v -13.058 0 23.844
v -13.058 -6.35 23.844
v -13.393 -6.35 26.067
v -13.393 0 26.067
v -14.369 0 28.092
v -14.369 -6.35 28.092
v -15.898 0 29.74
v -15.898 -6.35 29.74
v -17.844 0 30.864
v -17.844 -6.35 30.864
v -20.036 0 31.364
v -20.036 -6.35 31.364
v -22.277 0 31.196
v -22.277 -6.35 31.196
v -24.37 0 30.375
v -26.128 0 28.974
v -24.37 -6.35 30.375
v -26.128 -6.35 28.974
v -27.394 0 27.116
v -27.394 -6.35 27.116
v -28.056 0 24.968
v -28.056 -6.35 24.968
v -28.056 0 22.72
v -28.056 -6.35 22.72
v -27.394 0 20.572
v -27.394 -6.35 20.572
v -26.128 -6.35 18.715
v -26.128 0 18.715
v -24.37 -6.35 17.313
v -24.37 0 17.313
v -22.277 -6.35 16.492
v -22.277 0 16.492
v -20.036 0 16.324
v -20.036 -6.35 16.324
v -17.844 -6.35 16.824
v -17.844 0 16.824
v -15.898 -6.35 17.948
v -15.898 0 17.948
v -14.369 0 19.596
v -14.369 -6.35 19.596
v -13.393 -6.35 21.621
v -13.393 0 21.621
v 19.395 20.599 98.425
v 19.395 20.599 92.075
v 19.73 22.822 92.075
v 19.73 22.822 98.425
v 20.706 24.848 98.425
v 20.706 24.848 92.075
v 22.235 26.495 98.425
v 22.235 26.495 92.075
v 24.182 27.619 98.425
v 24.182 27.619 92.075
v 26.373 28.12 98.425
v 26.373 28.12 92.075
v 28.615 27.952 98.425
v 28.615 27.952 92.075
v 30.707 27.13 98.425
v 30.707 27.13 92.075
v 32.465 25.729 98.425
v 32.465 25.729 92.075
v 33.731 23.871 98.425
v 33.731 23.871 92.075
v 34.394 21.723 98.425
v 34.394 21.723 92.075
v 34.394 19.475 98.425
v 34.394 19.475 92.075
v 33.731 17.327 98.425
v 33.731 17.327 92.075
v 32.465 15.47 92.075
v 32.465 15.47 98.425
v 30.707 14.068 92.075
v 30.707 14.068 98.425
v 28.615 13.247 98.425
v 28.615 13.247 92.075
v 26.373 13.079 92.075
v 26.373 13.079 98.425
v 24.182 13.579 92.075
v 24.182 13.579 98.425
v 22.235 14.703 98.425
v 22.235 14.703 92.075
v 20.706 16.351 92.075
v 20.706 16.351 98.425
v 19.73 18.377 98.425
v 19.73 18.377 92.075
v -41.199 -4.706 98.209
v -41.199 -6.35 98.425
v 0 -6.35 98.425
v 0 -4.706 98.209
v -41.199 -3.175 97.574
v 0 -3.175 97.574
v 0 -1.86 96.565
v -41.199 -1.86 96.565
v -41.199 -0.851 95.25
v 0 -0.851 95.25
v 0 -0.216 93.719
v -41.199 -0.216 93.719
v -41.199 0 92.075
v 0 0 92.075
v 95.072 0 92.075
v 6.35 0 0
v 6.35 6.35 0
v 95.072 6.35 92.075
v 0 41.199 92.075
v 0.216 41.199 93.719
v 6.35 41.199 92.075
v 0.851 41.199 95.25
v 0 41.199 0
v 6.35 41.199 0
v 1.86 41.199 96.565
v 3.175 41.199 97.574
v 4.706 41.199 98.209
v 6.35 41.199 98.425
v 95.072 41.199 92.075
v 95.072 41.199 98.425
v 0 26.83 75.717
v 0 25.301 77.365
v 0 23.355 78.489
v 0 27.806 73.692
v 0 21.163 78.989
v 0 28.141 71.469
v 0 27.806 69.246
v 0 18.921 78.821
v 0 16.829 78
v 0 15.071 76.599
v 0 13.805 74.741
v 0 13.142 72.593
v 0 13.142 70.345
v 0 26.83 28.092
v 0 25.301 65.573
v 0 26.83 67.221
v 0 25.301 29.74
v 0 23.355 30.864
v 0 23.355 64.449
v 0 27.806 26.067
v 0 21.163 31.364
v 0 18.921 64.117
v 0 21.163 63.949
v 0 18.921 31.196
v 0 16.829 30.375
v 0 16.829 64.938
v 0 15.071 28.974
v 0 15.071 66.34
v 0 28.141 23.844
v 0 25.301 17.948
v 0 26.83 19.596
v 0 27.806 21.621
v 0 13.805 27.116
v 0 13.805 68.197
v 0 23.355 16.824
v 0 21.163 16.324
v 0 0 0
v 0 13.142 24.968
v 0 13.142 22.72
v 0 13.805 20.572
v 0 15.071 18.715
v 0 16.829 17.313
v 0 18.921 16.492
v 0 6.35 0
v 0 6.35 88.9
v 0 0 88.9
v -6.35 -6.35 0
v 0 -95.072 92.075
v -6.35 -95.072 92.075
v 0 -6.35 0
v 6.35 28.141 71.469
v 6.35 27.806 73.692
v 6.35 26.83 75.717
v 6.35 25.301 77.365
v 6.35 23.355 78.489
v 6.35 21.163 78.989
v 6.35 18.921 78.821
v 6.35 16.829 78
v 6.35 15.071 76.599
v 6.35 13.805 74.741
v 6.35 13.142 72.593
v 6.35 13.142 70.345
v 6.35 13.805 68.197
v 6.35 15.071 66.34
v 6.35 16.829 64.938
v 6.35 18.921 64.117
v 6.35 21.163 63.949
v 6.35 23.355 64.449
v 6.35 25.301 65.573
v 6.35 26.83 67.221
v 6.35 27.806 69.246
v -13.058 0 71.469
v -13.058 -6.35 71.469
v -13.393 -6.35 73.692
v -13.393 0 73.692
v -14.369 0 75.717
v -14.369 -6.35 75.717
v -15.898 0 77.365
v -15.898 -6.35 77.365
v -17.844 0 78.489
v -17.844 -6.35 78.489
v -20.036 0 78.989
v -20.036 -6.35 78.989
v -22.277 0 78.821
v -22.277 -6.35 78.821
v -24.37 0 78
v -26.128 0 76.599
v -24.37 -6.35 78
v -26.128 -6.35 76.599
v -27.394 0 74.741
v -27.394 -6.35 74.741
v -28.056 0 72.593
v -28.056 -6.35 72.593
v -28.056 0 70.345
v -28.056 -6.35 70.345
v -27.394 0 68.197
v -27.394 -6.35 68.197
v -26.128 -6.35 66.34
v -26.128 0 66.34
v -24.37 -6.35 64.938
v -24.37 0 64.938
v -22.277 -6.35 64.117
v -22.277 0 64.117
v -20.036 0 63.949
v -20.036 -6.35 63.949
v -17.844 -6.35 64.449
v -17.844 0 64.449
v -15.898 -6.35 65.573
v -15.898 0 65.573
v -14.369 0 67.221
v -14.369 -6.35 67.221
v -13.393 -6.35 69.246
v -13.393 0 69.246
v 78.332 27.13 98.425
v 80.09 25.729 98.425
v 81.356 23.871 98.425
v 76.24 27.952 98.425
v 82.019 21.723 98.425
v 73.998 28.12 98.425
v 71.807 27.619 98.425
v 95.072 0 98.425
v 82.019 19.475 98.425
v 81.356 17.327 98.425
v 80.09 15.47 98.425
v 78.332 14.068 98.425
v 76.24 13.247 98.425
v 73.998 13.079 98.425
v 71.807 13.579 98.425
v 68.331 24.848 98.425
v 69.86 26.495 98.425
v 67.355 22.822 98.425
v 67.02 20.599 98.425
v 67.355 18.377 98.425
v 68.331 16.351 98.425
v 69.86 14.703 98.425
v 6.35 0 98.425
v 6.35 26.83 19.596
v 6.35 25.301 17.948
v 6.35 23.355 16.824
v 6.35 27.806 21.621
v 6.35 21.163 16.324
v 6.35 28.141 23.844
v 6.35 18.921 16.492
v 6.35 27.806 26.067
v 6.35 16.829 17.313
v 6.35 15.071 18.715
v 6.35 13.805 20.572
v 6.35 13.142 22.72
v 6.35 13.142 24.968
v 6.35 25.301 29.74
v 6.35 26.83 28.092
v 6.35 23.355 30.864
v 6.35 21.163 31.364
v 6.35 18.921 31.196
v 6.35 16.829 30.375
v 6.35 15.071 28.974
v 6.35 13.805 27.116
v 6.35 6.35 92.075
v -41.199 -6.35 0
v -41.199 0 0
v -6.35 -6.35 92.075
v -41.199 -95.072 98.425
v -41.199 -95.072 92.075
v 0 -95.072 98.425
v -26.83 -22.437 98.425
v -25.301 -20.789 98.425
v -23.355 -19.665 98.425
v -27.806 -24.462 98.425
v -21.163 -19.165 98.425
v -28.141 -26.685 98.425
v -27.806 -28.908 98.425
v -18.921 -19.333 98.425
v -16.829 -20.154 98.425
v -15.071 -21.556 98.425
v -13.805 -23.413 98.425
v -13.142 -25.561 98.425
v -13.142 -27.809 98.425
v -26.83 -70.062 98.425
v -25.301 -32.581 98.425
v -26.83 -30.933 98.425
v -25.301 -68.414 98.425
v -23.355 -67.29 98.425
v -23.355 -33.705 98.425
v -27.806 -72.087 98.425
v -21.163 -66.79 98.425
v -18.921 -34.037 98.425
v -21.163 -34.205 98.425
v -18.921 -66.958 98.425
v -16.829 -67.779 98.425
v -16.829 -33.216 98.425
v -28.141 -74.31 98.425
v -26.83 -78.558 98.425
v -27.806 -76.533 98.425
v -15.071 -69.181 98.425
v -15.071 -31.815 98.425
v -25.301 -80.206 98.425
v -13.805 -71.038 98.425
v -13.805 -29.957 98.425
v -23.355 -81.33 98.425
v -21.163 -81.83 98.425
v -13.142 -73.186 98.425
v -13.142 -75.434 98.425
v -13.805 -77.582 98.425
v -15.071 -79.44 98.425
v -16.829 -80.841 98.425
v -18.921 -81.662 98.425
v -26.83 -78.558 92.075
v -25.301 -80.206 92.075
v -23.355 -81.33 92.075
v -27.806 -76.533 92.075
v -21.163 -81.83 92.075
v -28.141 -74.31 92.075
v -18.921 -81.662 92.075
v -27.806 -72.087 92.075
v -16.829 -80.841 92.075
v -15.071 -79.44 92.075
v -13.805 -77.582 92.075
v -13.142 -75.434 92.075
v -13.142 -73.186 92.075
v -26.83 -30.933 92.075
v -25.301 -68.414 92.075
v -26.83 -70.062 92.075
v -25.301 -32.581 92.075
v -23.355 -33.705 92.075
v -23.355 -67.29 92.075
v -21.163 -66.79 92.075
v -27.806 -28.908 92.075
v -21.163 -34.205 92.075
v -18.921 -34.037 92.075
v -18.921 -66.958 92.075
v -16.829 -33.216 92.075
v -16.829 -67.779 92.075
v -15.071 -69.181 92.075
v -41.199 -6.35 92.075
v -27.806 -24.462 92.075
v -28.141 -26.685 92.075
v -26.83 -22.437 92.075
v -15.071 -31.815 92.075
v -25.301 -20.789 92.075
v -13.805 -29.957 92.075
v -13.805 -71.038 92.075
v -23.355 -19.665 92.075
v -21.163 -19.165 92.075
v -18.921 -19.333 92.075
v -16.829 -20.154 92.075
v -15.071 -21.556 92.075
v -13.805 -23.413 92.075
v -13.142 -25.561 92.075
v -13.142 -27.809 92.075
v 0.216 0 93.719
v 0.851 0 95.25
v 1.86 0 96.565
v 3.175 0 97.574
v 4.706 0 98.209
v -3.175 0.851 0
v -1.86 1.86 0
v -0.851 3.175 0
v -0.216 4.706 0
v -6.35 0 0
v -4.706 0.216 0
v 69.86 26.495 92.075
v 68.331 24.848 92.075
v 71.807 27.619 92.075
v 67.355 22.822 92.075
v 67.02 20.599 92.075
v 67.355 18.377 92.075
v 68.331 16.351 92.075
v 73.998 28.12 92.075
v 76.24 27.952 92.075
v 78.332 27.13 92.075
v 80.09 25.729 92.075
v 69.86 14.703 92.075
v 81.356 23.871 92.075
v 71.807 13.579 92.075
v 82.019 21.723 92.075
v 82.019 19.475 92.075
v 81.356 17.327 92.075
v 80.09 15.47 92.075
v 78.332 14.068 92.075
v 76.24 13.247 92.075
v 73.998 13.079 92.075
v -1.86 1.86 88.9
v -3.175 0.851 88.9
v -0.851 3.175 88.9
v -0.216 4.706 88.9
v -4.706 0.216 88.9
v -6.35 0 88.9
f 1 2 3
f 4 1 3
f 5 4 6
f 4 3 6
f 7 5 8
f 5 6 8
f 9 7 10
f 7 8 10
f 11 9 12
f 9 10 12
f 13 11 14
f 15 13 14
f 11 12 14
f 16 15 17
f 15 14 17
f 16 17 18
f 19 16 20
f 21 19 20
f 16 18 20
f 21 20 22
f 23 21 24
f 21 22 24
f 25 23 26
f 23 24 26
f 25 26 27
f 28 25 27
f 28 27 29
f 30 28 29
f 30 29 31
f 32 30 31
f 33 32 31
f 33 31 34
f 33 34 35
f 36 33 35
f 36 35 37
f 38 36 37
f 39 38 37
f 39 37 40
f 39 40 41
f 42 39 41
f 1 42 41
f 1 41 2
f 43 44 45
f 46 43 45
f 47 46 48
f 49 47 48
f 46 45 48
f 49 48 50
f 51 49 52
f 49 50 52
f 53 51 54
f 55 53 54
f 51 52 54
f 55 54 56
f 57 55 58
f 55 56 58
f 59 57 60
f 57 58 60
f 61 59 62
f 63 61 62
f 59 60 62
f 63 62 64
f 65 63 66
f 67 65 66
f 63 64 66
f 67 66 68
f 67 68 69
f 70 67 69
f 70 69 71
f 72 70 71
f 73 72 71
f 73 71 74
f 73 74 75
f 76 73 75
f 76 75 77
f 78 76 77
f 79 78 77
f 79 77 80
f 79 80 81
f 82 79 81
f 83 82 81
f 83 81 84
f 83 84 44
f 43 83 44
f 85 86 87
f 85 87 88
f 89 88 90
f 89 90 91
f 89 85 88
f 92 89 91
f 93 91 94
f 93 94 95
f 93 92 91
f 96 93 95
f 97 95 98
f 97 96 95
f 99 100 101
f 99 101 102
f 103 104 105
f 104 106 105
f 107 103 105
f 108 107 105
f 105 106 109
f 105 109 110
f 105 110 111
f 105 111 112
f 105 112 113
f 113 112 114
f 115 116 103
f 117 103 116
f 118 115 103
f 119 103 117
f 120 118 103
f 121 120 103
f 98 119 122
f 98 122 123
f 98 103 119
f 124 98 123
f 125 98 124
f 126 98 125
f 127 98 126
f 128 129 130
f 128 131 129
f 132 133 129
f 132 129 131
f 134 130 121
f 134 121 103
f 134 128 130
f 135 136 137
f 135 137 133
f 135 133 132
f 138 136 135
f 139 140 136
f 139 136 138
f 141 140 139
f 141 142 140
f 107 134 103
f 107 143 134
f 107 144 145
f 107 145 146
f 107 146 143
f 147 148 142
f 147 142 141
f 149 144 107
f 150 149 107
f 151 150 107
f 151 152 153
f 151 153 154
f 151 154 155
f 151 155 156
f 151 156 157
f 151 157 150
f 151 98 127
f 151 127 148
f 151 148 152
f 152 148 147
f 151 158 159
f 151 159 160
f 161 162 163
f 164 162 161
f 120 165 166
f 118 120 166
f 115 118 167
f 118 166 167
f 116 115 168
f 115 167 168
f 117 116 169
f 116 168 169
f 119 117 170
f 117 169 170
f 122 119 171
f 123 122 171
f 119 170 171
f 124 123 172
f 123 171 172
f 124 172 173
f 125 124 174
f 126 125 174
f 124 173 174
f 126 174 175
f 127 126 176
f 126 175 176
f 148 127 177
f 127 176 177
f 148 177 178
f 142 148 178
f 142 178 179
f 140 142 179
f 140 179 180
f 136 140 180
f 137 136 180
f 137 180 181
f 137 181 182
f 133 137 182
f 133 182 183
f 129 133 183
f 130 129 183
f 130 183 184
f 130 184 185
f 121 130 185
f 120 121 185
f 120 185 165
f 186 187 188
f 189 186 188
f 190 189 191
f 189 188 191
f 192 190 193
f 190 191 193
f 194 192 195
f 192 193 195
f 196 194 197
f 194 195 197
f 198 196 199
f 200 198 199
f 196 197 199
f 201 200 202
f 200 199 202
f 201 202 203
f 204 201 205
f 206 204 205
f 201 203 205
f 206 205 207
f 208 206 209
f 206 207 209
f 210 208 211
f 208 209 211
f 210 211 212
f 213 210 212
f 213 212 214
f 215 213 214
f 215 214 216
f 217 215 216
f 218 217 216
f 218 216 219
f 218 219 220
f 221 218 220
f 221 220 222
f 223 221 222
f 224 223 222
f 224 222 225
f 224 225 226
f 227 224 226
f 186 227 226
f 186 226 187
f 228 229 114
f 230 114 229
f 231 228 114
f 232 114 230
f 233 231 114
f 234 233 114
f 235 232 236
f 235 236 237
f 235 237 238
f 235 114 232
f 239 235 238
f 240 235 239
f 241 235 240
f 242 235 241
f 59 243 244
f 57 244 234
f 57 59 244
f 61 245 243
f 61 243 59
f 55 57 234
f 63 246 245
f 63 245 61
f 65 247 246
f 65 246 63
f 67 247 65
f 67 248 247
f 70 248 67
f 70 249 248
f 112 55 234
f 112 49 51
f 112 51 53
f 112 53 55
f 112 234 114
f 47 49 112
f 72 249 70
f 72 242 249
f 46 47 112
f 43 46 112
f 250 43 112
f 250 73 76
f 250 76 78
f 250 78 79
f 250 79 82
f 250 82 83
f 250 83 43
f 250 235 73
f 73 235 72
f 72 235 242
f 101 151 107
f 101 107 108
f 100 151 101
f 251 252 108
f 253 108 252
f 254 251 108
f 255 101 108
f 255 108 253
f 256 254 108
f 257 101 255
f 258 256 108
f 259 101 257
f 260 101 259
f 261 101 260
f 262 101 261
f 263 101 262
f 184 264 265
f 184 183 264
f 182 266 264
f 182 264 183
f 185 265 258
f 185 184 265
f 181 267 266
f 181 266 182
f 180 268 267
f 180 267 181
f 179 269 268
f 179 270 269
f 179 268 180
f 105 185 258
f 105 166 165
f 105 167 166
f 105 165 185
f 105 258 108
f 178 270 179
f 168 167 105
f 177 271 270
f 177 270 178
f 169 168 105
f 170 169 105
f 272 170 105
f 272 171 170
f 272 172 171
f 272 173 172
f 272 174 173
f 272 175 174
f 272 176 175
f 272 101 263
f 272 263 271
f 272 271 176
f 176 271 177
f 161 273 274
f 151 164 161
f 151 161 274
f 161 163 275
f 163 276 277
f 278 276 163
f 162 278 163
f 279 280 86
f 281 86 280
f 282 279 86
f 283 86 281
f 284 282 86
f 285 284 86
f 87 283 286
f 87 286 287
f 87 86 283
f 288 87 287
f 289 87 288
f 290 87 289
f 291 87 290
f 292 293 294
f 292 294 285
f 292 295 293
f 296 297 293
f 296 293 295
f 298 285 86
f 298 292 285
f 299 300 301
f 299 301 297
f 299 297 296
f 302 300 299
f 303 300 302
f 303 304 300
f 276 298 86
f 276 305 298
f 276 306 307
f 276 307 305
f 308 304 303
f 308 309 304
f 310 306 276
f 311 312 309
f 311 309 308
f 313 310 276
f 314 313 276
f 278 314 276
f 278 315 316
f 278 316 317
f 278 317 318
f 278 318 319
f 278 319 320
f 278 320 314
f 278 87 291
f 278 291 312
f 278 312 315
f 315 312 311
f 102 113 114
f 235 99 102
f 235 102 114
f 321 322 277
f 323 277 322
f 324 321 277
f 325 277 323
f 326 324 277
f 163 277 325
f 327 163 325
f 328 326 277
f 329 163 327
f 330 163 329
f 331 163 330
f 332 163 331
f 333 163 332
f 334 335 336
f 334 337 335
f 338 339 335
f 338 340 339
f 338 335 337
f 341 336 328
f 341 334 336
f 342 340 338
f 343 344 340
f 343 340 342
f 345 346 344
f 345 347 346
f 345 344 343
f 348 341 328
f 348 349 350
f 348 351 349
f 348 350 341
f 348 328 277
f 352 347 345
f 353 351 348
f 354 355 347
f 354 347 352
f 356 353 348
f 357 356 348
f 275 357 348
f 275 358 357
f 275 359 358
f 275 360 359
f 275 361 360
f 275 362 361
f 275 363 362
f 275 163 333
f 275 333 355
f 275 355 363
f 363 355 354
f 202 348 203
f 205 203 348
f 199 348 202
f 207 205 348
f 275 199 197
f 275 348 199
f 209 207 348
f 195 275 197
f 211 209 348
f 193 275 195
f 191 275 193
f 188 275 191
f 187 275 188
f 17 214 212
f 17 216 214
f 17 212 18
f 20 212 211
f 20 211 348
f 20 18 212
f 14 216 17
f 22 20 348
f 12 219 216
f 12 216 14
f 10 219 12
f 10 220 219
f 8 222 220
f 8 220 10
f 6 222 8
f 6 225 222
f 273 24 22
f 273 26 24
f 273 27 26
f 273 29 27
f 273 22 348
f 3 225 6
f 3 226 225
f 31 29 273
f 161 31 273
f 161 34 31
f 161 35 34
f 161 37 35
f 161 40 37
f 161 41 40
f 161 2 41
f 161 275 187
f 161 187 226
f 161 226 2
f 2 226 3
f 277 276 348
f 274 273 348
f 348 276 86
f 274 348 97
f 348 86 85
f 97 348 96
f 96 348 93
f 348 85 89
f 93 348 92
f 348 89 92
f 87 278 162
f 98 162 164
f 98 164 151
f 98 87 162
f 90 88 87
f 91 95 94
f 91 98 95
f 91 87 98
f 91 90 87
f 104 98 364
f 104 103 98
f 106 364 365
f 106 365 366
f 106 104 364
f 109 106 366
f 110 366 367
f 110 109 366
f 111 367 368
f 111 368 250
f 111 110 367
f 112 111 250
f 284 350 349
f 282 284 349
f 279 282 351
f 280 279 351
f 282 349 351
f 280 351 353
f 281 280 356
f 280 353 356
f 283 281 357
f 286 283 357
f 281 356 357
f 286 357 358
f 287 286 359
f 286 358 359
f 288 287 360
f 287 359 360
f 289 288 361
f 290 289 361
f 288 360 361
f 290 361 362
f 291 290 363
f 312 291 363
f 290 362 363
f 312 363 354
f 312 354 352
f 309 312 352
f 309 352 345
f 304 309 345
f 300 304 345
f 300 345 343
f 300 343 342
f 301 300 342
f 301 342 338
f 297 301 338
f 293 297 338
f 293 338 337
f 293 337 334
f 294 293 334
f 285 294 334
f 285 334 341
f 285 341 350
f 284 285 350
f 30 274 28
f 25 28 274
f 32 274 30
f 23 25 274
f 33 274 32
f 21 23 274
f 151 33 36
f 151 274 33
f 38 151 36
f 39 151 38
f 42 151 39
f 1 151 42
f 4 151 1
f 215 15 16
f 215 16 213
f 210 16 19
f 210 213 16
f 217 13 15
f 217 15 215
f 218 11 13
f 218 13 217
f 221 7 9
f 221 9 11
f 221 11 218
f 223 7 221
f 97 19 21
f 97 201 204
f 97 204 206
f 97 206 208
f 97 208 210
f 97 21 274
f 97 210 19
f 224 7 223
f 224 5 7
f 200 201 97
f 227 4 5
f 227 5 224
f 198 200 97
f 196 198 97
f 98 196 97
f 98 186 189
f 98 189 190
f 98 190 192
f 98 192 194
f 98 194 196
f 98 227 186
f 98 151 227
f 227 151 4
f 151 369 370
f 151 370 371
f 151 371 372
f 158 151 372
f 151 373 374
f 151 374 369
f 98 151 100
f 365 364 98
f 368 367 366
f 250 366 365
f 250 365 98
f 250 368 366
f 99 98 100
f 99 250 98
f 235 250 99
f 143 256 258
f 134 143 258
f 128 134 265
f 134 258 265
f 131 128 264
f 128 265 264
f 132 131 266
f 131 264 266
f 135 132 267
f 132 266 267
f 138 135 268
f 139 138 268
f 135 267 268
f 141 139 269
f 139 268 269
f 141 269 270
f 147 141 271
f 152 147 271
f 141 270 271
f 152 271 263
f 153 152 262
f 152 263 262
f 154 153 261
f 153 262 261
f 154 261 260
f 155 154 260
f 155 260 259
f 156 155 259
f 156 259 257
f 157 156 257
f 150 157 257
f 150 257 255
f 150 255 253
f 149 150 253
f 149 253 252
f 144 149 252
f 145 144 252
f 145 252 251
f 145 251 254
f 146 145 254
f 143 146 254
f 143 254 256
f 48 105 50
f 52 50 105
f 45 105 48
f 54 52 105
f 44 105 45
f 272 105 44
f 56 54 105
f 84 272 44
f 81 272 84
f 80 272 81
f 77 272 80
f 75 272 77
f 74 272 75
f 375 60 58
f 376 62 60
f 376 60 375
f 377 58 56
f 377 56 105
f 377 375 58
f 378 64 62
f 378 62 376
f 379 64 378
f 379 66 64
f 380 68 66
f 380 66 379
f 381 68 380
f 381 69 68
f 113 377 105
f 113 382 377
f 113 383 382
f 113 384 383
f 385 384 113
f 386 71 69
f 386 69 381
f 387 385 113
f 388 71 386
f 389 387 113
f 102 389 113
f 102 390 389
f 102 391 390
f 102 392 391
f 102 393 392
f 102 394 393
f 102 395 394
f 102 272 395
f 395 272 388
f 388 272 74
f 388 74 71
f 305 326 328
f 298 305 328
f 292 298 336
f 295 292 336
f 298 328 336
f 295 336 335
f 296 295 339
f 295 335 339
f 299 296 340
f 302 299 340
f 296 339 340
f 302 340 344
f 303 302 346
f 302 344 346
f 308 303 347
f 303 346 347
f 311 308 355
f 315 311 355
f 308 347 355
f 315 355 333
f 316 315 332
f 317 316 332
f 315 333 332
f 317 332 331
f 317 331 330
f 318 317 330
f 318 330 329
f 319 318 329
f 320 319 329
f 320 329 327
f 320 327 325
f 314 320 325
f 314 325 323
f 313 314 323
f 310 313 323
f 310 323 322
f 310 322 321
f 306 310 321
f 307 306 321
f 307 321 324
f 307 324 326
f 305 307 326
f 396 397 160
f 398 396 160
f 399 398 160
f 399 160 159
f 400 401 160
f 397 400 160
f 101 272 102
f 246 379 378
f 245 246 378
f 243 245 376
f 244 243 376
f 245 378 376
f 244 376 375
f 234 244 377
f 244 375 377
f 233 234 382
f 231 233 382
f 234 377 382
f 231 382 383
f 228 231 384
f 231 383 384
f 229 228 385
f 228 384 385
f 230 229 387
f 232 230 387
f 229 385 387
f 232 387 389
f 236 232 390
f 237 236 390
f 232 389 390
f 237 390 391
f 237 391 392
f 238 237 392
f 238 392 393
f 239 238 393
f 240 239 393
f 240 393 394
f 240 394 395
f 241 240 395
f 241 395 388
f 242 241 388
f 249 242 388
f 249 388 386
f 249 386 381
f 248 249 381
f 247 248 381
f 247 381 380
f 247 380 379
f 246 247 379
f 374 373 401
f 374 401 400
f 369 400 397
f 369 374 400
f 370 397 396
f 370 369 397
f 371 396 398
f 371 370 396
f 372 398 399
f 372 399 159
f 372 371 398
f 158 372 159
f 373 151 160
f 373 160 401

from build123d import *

# Parameters (mm, degrees)
F1_DEPTH     = 41.1988
F3_DEPTH     = 41.1988
F4_T1_DEPTH  = 72.9488
F5_R         = 6.35
F14_D        = 15.08252
F14_ON_F9_D  = 15.08252
F14_ON_F11_D = 15.08252
F14_ON_F13_D = 15.08252
F17_DEPTH    = 88.9
F20_DEPTH    = 6.35
F23_DEPTH    = 6.35


# Not quite as in the source:
# - a fillet or chamfer that OpenCascade refuses, or shapes differently, is made with other operations: its cross-section is extruded or revolved along the edge and cut away or added


with BuildPart() as f1:
    # F0 (on Right) → F1 (new body)
    with BuildSketch(Plane.YZ):
        Polygon((0, 98.425), (-95.0722, 98.425), (-95.0722, 92.075), (-6.35, 92.075), (-6.35, 0), (0, 0), align=None)
    extrude(amount=-F1_DEPTH)

    # F2 (on Front) → F3 (join)
    with BuildSketch(Plane.XZ):
        Polygon((95.0722, 92.075), (95.0722, 98.425), (0, 98.425), (0, 0), (6.35, 0), (6.35, 92.075), align=None)
    extrude(amount=-F3_DEPTH)

    # F4: fillet of radius 6.35 on 1 edges, made by hand

    # F4_s2 → F4_t1 (cut)
    with BuildSketch(Plane.YZ.offset(-57.0738)):
        with BuildLine():
            ThreePointArc((-6.35, 98.425), (-1.8598719395, 96.5651280605), (0, 92.075))
            Line((0, 92.075), (0, 98.425))
            Line((0, 98.425), (-6.35, 98.425))
        make_face()
    extrude(amount=F4_T1_DEPTH, mode=Mode.SUBTRACT)

    # F5
    f5_edges = [f1.edges().sort_by_distance(p)[0] for p in [
        (0, 20.5994, 98.425),
    ]]
    fillet(f5_edges, radius=F5_R)

    # F14 (through all)
    with Locations(Plane(origin=(0, 0, 0), x_dir=(-1, 0, 0), z_dir=(0, 1, 0))):
        with Locations((20.5994, 23.84425), (20.5994, 71.46925)):
            Hole(F14_D / 2)

    # F14 on F9 (through all)
    with Locations(Plane.XY.offset(98.425)):
        with Locations((-20.5994, -26.68524), (-20.5994, -74.31024)):
            Hole(F14_ON_F9_D / 2)

    # F14 on F11 (through all)
    with Locations(Plane(origin=(0, 0, 0), x_dir=(0, -1, 0), z_dir=(-1, 0, 0))):
        with Locations((-20.5994, 23.84425), (-20.5994, 71.46925)):
            Hole(F14_ON_F11_D / 2)

    # F14 on F13 (through all)
    with Locations(Plane.XY.offset(98.425)):
        with Locations((26.9367, 20.5994), (74.5617, 20.5994)):
            Hole(F14_ON_F13_D / 2)

    # F19 (on offset) → F20 (join)
    with BuildSketch(Plane.YZ):
        Polygon((-6.35, 0), (-6.35, 92.075), (-95.0722, 92.075), align=None)
    extrude(amount=-F20_DEPTH)

    # F22 (on offset) → F23 (join)
    with BuildSketch(Plane.XZ):
        Polygon((95.0722, 92.075), (6.35, 92.075), (6.35, 0), align=None)
    extrude(amount=-F23_DEPTH)


with BuildPart() as f17:
    # F16 (on offset) → F17 (new body)
    with BuildSketch(Plane(origin=(0, 0, 0), x_dir=(1, 0, 0), z_dir=(0, 0, -1))):
        with BuildLine():
            ThreePointArc((-6.35, 0), (-1.8598719395, -1.8598719395), (0, -6.35))
            Line((0, -6.35), (0, 0))
            Line((0, 0), (-6.35, 0))
        make_face()
    extrude(amount=-F17_DEPTH)


solid = Compound([f1.part, f17.part])
